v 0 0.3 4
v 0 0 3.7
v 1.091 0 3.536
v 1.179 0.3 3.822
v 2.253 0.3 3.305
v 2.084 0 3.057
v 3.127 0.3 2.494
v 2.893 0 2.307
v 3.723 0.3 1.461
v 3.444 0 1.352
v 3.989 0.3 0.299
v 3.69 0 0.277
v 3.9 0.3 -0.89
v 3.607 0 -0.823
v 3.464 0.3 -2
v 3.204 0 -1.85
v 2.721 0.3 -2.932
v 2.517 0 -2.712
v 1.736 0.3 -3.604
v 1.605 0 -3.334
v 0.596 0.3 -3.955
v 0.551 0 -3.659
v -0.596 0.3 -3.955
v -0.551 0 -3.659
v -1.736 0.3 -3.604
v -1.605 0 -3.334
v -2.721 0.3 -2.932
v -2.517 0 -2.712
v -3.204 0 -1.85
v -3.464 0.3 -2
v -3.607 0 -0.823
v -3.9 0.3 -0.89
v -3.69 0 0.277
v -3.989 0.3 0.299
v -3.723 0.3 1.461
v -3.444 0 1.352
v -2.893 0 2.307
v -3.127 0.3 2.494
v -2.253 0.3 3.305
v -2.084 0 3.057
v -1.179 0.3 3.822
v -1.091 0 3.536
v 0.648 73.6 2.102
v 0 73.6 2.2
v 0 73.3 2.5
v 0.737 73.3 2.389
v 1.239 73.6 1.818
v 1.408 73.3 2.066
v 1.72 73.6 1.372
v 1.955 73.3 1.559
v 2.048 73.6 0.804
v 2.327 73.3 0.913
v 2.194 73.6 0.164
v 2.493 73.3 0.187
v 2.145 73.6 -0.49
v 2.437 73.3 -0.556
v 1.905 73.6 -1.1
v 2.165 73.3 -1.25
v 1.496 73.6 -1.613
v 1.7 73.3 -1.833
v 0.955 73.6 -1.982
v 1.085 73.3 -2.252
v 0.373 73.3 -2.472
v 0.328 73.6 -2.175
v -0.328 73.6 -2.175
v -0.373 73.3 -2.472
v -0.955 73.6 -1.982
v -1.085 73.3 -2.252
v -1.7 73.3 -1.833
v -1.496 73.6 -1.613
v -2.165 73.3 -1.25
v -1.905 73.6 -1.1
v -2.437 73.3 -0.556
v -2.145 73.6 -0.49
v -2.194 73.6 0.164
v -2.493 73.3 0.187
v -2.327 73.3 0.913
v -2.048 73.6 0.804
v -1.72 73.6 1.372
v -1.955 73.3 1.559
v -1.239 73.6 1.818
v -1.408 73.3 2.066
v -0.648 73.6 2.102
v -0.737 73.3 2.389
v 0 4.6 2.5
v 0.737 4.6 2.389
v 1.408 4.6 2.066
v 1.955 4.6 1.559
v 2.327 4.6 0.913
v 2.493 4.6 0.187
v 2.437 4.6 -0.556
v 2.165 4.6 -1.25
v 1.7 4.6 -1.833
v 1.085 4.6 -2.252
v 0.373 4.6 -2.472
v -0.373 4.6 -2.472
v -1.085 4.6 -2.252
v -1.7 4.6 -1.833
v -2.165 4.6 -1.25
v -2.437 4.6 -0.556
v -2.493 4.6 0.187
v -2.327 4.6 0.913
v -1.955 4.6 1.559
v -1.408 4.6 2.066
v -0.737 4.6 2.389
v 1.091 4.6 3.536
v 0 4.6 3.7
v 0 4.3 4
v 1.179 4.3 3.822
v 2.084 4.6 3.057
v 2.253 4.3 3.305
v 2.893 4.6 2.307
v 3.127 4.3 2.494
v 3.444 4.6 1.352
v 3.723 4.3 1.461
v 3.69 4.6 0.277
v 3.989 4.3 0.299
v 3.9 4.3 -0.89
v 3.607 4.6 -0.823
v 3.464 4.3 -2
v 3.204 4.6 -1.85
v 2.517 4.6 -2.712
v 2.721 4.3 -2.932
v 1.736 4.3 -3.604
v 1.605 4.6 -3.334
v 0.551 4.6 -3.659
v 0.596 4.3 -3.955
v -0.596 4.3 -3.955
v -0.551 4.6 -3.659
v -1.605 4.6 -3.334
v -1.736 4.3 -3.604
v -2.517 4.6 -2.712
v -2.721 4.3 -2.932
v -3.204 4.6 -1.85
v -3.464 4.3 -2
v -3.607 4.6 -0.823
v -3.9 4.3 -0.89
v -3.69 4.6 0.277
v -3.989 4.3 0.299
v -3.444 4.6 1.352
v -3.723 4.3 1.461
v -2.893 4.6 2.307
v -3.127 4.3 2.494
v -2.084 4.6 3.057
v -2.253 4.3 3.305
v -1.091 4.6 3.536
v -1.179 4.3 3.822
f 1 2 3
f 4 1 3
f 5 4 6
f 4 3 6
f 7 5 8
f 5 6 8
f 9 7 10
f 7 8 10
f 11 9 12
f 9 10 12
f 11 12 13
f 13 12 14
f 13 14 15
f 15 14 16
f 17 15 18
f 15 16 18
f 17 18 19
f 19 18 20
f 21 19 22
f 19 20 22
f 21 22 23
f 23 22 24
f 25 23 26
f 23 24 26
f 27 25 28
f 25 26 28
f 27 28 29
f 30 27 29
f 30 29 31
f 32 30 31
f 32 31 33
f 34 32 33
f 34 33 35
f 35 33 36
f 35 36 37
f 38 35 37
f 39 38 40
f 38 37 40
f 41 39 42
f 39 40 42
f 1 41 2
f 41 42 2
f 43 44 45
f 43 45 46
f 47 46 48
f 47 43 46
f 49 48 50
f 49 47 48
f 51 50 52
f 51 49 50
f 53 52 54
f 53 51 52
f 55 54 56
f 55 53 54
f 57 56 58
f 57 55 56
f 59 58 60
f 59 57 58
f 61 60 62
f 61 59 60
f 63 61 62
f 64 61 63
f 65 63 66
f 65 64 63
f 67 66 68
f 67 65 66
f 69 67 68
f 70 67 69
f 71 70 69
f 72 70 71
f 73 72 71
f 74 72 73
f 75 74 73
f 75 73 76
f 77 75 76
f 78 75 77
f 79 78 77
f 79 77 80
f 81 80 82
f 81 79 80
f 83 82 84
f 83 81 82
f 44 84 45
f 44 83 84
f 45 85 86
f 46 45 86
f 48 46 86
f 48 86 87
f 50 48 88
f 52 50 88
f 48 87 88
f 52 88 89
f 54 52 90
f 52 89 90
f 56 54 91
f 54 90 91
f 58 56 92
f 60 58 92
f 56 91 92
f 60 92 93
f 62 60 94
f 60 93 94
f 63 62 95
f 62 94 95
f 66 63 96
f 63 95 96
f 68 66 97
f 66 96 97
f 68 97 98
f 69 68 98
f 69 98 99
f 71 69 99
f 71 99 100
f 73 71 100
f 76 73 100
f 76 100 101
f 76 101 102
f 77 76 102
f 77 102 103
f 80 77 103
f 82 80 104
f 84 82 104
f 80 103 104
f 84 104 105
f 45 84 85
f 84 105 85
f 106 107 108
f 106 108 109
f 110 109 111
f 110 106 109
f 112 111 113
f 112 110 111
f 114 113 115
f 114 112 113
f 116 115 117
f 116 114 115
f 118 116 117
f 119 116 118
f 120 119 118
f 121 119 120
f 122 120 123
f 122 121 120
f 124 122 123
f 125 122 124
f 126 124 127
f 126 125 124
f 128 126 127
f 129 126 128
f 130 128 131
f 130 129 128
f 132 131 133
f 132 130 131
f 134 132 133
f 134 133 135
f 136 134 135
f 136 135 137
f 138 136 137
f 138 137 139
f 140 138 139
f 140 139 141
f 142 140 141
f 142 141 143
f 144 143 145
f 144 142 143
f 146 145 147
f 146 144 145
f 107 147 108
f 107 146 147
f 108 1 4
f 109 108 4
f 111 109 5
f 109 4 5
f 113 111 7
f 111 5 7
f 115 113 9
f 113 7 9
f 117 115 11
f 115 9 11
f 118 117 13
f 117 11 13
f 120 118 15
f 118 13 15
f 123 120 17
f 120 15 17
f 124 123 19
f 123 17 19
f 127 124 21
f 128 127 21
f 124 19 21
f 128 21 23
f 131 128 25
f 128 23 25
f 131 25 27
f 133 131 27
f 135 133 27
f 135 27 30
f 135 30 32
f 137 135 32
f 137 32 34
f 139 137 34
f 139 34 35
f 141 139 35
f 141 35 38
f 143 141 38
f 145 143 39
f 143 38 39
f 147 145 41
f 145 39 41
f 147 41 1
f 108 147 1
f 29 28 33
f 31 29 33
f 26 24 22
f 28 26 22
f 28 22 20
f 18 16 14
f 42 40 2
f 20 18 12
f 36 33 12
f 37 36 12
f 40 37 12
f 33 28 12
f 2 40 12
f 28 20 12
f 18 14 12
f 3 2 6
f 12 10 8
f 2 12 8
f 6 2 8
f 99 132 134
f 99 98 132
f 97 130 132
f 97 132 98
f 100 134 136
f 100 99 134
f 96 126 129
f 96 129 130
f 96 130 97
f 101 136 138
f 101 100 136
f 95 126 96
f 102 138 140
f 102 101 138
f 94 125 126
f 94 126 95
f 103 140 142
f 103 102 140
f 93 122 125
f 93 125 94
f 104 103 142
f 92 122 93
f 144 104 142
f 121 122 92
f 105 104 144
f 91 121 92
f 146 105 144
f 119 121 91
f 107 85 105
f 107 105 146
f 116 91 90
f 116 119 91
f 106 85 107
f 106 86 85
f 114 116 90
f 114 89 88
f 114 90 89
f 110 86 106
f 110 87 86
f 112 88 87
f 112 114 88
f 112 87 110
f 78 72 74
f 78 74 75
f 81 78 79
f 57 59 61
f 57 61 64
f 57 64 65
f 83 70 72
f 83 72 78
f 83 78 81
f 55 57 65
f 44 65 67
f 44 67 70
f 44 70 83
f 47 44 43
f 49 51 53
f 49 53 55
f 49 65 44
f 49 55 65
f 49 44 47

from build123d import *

# Parameters (mm, degrees)
SKETCH1_R           = 4
BOSS_EXTRUDE1_DEPTH = 4.6
SKETCH2_R           = 2.5
BOSS_EXTRUDE2_DEPTH = 69
CHAMFER1_SIZE       = 0.3
CHAMFER2_SIZE       = 0.3


with BuildPart() as part:
    # Sketch1 → Boss-Extrude1 (new body)
    with BuildSketch(Plane(origin=(0, 0, 0), x_dir=(1, 0, 0), z_dir=(0, 1, 0))):
        with Locations(Location((0, 0, 0), (0, 0, 270))):
            Circle(SKETCH1_R)
    extrude(amount=BOSS_EXTRUDE1_DEPTH)

    # Sketch2 → Boss-Extrude2 (add)
    with BuildSketch(Plane(origin=(0, 4.6, 0), x_dir=(1, 0, 0), z_dir=(0, 1, 0))):
        with Locations(Location((0, 0, 0), (0, 0, 270))):
            Circle(SKETCH2_R)
    extrude(amount=BOSS_EXTRUDE2_DEPTH)

    # Chamfer1
    chamfer1_edges = [part.edges().sort_by_distance(p)[0] for p in [
        (0, 0, -4),
        (0, 4.6, -4),
    ]]
    chamfer(chamfer1_edges, length=CHAMFER1_SIZE)

    # Chamfer2
    chamfer2_edges = [part.edges().sort_by_distance(p)[0] for p in [
        (0, 73.6, -2.5),
    ]]
    chamfer(chamfer2_edges, length=CHAMFER2_SIZE)


solid = part.part
